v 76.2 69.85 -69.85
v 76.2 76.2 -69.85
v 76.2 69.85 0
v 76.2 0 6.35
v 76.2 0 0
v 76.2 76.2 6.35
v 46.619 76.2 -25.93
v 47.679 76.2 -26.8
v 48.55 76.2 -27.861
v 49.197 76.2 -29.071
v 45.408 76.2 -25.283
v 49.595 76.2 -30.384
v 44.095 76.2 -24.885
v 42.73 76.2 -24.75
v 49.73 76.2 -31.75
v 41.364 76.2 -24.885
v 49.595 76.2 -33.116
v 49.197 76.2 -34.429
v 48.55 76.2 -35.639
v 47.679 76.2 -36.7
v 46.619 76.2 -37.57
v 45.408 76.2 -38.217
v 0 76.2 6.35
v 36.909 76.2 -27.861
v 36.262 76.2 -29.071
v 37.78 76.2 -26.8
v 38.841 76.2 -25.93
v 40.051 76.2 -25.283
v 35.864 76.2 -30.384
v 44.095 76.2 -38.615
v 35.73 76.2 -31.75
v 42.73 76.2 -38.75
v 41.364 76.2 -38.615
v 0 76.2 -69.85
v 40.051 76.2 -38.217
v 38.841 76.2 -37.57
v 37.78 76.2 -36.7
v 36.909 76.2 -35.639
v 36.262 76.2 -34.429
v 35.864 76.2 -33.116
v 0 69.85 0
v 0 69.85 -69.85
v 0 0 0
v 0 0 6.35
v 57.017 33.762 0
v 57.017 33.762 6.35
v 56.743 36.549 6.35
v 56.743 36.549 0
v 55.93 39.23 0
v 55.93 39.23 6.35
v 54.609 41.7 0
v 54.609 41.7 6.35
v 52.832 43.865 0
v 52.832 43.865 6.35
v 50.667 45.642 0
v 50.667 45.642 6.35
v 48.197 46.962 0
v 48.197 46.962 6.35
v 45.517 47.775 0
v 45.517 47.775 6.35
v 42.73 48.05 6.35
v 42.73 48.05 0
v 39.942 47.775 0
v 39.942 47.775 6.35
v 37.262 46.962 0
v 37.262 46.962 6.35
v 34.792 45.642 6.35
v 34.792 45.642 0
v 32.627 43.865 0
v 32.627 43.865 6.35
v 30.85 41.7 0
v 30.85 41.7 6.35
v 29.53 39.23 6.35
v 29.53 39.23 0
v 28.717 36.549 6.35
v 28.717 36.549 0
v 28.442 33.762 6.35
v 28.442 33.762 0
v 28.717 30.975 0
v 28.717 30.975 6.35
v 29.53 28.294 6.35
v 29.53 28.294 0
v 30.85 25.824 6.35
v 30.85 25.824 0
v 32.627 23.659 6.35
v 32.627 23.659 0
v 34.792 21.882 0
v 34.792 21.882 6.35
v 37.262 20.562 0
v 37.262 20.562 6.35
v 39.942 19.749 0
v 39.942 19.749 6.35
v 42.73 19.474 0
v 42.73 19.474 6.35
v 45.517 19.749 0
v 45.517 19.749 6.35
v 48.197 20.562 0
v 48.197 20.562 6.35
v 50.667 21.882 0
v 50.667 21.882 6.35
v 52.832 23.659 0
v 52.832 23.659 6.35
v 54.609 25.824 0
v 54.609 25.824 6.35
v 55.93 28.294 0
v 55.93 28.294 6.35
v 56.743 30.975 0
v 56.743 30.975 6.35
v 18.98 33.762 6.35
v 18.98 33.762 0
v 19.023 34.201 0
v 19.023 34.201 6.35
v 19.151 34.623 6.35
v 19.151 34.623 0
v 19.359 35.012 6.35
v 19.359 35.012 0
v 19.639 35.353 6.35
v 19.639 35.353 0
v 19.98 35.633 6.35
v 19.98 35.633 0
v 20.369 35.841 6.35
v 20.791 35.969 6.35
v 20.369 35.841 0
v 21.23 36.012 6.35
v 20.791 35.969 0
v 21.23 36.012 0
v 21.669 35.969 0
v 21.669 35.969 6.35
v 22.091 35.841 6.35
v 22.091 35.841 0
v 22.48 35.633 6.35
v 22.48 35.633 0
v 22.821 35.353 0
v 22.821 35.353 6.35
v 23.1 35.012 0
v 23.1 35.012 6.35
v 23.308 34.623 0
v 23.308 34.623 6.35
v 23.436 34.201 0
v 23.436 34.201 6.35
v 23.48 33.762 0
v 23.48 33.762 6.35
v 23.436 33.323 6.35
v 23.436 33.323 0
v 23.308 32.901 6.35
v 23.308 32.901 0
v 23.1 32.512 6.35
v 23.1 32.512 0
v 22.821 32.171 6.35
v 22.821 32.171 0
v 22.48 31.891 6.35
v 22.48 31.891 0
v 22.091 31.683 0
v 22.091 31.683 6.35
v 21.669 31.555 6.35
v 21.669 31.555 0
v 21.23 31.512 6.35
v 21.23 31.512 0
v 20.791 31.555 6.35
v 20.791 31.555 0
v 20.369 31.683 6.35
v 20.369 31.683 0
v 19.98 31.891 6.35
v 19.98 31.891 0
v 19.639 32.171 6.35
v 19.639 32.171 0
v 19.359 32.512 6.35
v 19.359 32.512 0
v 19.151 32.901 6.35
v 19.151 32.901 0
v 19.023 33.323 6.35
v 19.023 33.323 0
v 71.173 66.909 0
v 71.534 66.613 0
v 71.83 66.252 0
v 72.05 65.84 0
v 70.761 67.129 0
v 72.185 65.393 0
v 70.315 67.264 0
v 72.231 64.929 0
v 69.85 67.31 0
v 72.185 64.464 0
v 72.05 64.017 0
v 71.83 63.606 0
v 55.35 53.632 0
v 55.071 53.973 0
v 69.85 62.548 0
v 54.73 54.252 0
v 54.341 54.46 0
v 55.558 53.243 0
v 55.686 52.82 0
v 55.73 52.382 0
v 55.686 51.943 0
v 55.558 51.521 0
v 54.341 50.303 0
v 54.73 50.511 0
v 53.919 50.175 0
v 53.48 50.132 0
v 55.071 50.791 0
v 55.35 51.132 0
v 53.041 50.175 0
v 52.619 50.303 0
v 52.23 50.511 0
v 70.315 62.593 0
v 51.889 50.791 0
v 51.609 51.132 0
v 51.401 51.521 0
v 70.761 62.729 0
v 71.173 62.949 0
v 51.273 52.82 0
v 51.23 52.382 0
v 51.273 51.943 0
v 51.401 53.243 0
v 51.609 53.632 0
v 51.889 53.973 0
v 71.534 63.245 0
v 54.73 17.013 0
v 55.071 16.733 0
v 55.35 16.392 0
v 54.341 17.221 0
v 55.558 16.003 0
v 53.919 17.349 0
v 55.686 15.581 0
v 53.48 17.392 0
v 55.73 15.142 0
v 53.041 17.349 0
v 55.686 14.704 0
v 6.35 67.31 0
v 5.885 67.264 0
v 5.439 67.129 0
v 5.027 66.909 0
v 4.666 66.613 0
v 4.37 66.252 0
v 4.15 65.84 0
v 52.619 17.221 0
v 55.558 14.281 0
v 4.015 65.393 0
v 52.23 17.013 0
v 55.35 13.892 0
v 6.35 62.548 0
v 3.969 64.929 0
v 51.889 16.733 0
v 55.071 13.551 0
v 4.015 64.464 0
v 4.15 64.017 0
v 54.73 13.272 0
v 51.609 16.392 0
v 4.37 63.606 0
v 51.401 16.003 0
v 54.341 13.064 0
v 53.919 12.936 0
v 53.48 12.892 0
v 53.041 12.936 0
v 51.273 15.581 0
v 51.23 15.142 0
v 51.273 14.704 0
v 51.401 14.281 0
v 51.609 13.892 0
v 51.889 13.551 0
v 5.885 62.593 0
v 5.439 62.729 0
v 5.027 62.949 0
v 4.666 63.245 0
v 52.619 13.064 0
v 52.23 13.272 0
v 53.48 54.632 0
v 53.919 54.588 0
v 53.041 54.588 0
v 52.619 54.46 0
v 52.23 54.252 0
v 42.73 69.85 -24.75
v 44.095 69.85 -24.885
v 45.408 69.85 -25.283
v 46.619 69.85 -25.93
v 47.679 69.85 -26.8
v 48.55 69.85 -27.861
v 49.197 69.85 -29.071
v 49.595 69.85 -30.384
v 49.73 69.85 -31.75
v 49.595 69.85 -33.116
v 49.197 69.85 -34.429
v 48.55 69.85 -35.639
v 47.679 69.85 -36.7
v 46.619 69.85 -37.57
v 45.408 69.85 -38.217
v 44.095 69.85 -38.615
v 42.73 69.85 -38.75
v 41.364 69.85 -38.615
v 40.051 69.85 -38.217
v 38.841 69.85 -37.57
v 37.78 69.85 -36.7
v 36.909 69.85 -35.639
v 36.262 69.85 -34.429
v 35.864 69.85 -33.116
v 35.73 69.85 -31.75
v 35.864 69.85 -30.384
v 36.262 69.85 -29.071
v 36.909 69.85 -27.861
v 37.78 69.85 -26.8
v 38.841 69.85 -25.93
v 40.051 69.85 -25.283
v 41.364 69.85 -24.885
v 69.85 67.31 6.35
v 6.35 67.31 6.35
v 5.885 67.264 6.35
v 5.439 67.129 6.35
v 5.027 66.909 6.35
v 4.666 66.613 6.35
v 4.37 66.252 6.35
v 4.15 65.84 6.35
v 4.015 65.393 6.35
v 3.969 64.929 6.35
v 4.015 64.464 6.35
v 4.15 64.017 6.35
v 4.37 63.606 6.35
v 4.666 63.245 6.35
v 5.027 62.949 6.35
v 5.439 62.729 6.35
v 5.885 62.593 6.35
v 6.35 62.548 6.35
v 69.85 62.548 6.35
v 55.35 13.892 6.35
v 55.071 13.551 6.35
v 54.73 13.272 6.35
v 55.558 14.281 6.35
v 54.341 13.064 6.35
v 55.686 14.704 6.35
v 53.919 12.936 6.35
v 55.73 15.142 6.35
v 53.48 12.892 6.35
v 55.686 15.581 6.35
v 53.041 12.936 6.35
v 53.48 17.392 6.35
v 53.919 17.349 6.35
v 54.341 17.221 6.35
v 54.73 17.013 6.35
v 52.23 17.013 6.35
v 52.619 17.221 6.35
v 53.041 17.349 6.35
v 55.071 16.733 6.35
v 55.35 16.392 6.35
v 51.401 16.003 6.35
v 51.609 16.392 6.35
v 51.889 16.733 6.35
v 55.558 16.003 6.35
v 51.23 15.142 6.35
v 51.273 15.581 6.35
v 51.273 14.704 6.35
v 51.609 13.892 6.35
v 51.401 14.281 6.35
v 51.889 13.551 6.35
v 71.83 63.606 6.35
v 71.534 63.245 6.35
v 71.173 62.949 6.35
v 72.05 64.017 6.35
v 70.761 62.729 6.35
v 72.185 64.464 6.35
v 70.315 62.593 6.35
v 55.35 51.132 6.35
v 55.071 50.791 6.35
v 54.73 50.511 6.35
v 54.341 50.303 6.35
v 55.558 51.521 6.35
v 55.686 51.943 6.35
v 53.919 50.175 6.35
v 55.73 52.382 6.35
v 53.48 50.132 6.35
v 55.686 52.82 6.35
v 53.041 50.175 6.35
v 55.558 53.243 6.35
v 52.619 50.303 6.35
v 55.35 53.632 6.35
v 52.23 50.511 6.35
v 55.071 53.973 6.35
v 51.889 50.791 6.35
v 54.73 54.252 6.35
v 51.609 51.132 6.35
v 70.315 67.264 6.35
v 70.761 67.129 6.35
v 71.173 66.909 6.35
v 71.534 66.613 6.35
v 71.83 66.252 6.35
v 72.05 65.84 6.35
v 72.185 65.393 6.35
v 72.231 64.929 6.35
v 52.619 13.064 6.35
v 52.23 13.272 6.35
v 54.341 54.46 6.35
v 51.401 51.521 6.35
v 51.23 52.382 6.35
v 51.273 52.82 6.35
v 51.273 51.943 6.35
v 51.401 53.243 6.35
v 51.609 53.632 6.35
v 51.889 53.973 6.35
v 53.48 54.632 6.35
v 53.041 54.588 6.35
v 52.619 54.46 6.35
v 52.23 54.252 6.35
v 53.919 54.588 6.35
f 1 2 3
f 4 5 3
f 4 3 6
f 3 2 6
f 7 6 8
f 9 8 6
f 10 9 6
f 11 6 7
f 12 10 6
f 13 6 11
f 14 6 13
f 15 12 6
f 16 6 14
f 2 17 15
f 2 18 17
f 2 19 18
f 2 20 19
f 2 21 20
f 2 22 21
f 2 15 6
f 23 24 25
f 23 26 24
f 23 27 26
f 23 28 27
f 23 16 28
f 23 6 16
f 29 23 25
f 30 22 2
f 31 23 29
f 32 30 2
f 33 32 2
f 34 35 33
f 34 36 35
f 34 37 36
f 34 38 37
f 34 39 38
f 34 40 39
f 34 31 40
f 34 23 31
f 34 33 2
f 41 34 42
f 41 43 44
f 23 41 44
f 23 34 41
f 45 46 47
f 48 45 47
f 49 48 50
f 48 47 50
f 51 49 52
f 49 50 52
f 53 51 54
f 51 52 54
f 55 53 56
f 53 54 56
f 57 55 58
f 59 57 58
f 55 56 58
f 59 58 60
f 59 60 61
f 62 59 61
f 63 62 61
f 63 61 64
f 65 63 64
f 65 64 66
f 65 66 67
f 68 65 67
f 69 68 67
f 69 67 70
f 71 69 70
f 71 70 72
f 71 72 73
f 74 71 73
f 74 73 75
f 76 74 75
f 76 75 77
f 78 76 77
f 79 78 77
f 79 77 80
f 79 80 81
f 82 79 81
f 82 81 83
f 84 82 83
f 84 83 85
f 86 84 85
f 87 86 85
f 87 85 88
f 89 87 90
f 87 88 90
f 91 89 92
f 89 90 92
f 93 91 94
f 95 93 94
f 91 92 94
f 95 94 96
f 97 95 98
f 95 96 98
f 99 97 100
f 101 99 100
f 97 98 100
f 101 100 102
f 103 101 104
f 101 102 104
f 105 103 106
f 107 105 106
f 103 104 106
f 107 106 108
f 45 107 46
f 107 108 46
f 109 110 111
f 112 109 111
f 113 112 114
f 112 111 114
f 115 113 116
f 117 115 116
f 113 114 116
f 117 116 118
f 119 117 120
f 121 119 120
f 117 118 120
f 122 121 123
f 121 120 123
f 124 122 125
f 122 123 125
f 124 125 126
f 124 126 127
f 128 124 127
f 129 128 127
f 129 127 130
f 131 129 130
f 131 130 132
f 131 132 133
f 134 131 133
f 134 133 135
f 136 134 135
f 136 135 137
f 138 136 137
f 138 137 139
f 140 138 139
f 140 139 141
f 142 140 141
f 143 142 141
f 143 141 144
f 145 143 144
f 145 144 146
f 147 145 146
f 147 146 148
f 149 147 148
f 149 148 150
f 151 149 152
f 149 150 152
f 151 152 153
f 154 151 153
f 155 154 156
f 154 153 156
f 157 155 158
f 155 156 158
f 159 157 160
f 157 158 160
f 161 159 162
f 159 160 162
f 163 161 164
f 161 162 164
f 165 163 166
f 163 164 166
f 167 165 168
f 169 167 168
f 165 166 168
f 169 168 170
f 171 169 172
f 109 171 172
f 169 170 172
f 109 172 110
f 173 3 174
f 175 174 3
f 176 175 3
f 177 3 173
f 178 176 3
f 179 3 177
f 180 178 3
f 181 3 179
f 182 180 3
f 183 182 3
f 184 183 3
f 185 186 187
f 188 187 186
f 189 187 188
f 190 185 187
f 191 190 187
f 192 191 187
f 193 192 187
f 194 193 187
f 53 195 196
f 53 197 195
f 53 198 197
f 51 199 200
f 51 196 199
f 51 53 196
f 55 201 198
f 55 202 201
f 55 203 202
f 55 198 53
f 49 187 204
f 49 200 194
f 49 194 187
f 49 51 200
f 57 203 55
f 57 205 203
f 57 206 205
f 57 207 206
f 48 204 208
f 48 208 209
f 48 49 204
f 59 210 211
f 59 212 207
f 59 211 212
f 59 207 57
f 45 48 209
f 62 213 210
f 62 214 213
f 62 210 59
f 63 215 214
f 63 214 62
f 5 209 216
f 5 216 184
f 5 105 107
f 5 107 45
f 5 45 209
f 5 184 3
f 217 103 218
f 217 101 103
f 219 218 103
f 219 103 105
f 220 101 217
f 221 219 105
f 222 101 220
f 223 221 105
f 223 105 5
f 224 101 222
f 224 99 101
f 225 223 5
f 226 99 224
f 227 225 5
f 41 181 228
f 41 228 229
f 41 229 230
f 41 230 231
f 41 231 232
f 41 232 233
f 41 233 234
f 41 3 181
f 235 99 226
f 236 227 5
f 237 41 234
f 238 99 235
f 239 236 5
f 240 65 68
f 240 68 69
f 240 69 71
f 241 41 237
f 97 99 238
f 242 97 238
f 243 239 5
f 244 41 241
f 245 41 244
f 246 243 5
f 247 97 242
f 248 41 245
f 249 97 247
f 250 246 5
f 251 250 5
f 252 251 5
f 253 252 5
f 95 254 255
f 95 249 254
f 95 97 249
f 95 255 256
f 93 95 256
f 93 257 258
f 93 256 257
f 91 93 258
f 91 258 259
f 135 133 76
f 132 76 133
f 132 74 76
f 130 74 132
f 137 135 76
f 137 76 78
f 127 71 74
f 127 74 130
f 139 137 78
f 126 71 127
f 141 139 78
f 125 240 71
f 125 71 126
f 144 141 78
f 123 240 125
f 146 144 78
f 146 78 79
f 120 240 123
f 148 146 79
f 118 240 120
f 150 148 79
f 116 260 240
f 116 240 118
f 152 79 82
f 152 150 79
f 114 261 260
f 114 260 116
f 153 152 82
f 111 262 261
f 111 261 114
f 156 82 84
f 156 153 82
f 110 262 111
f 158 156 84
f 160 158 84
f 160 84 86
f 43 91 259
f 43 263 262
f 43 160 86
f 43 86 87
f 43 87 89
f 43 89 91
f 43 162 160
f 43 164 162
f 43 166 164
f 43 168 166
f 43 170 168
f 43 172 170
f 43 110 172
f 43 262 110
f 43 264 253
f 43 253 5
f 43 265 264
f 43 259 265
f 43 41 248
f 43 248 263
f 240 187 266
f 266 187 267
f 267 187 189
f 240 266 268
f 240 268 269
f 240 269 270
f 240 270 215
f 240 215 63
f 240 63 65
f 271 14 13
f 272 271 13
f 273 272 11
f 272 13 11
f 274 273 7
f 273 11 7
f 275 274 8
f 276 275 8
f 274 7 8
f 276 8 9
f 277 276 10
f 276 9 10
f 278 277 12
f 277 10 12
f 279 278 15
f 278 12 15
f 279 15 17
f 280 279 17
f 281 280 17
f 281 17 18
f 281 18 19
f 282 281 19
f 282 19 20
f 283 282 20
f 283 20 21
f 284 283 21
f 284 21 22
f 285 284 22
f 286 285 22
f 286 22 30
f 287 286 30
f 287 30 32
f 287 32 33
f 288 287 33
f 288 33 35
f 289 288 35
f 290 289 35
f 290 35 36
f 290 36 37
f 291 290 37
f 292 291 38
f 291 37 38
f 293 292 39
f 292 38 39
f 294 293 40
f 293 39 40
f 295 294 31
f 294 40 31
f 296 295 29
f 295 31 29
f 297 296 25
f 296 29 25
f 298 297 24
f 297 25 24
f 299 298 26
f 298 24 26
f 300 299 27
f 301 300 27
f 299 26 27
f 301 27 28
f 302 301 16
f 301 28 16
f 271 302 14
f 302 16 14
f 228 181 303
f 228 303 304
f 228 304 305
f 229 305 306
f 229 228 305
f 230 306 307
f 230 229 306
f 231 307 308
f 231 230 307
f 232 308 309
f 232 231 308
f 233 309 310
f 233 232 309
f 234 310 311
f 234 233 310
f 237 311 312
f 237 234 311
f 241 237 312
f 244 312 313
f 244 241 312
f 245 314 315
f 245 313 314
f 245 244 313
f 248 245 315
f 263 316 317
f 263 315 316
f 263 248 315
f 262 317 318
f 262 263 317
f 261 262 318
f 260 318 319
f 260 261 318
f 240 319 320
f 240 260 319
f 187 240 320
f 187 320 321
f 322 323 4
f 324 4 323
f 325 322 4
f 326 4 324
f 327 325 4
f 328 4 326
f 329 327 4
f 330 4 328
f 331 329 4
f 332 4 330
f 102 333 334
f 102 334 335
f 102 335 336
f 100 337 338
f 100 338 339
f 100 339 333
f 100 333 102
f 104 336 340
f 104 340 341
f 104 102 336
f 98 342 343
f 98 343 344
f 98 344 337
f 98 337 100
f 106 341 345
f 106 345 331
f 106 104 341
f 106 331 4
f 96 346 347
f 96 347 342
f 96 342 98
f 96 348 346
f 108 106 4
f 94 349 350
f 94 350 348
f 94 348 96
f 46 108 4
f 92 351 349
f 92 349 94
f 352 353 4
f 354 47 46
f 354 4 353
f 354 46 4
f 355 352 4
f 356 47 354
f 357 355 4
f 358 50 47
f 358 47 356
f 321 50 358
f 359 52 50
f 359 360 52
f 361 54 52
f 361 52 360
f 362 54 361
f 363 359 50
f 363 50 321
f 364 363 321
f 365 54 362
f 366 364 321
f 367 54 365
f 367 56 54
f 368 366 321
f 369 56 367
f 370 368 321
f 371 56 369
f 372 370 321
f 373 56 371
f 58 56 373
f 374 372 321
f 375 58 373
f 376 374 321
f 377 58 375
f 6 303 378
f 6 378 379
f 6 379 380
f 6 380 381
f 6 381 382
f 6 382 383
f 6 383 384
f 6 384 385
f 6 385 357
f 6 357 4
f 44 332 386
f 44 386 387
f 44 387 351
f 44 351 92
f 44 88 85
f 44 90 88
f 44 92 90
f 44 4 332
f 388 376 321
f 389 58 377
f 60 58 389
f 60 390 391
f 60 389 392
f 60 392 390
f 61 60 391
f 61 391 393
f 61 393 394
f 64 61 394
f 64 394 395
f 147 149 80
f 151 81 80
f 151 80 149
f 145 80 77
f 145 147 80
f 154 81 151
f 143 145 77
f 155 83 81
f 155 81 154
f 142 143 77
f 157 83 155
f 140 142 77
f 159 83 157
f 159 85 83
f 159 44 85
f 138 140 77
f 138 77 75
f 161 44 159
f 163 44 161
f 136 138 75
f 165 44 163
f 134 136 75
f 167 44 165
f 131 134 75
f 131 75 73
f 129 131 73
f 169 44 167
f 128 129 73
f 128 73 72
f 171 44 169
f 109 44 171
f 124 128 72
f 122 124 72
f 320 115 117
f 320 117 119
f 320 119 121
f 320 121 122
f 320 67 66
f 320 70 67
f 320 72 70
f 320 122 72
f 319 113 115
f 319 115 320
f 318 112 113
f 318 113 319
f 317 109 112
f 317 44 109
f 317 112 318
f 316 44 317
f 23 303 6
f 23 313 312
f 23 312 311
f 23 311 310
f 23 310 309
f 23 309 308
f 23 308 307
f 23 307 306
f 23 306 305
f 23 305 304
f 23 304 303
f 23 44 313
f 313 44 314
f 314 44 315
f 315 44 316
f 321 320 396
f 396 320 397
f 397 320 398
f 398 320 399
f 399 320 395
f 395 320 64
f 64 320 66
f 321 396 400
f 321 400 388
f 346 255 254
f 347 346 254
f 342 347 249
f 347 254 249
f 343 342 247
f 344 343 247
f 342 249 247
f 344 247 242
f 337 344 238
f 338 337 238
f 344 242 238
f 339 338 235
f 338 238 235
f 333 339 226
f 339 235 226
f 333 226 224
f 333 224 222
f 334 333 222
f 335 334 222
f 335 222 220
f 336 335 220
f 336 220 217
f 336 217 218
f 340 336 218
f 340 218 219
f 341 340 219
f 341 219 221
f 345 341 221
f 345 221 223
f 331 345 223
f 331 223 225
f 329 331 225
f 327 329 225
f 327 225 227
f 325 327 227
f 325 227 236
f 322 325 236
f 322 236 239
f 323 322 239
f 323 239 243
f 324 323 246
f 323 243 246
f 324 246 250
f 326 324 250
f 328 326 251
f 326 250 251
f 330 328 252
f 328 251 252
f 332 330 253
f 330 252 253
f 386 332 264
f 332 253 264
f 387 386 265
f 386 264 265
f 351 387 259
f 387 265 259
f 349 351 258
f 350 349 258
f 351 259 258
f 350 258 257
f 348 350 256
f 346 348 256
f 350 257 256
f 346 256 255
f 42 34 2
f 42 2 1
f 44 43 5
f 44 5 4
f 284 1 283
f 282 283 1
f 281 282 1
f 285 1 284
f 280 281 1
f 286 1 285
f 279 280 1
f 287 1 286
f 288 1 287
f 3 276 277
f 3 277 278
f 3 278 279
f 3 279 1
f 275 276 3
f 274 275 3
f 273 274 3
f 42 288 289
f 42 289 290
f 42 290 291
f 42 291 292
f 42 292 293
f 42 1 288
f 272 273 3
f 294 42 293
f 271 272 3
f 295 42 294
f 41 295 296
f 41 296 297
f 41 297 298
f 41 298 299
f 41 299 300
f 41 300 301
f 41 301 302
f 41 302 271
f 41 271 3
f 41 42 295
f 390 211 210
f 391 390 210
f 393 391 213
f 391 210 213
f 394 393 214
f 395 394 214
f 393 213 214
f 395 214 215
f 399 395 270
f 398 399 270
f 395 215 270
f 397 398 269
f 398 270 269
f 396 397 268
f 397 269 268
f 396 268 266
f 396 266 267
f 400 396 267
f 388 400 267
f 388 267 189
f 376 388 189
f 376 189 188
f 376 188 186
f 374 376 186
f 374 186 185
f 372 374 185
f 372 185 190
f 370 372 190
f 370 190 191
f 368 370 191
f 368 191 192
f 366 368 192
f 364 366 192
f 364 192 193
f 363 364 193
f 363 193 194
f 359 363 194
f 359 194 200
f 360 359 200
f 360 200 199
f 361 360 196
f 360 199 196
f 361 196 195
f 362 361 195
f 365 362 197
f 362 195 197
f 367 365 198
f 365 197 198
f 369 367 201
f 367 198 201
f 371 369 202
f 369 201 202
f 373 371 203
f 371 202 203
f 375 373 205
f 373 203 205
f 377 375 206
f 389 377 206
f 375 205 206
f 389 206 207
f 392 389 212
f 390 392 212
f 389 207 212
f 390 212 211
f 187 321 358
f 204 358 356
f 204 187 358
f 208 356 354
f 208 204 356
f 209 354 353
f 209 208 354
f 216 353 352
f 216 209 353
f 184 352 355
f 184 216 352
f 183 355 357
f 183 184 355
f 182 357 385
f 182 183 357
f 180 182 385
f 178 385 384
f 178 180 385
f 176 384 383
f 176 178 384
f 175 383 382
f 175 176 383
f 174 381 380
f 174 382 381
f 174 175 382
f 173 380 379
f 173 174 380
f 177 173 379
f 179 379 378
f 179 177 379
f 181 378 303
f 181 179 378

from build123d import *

# Parameters (mm, degrees)
BOSS_EXTRUDE1_DEPTH  = 76.2
SKETCH2_R            = 14.2875
CUT_EXTRUDE1_DEPTH   = 132.982271537
M4_CLEARANCE_HOLE1_D = 4.5
CUT_EXTRUDE2_REACH   = 130.421
SKETCH6_R            = 7
CUT_EXTRUDE3_DEPTH   = 129.420802443


with BuildPart() as part:
    # Sketch1 → Boss-Extrude1 (new body)
    with BuildSketch(Plane(origin=(0, 0, 0), x_dir=(0, 0, -1), z_dir=(1, 0, 0))):
        Polygon((-6.35, 76.2), (69.85, 76.2), (69.85, 69.85), (0, 69.85), (0, 0), (-6.35, 0), align=None)
    extrude(amount=BOSS_EXTRUDE1_DEPTH)

    # Sketch2 → Cut-Extrude1 (cut, through all)
    with BuildSketch(Plane.XY.offset(6.35)):
        with Locations((42.729606228, 33.762)):
            Circle(SKETCH2_R)
    extrude(amount=-CUT_EXTRUDE1_DEPTH, mode=Mode.SUBTRACT)

    # M4 Clearance Hole1 (through all)
    with Locations(Plane.XY.offset(6.35)):
        with Locations((53.479606228, 52.381546181), (21.229606228, 33.762), (53.479606228, 15.142453819)):
            Hole(M4_CLEARANCE_HOLE1_D / 2)

    # Sketch6 → Cut-Extrude2 (cut, up to next)
    with BuildSketch(Plane(origin=(0, 76.2, 0), x_dir=(1, 0, 0), z_dir=(0, 1, 0)), mode=Mode.PRIVATE) as cut_extrude2_sk1:
        with Locations(Location((42.729614414, 31.75, 0), (0, 0, 270))):
            Circle(SKETCH6_R)
    cut_extrude2_tool1 = extrude(cut_extrude2_sk1.sketch, amount=-CUT_EXTRUDE2_REACH, mode=Mode.PRIVATE) & part.part
    add(cut_extrude2_tool1.solids().sort_by_distance((42.729614, 76.2, -31.75))[0], mode=Mode.SUBTRACT)

    # Sketch7 → Cut-Extrude3 (cut, through all)
    with BuildSketch(Plane(origin=(0, 0, 0), x_dir=(-1, 0, 0), z_dir=(0, 0, -1))):
        with BuildLine():
            Line((-69.85, 67.31), (-6.35, 67.31))
            ThreePointArc((-6.35, 67.31), (-3.96875, 64.92875), (-6.35, 62.5475))
            Line((-6.35, 62.5475), (-69.85, 62.5475))
            ThreePointArc((-69.85, 62.5475), (-72.23125, 64.92875), (-69.85, 67.31))
        make_face()
    extrude(amount=-CUT_EXTRUDE3_DEPTH, mode=Mode.SUBTRACT)


solid = part.part
